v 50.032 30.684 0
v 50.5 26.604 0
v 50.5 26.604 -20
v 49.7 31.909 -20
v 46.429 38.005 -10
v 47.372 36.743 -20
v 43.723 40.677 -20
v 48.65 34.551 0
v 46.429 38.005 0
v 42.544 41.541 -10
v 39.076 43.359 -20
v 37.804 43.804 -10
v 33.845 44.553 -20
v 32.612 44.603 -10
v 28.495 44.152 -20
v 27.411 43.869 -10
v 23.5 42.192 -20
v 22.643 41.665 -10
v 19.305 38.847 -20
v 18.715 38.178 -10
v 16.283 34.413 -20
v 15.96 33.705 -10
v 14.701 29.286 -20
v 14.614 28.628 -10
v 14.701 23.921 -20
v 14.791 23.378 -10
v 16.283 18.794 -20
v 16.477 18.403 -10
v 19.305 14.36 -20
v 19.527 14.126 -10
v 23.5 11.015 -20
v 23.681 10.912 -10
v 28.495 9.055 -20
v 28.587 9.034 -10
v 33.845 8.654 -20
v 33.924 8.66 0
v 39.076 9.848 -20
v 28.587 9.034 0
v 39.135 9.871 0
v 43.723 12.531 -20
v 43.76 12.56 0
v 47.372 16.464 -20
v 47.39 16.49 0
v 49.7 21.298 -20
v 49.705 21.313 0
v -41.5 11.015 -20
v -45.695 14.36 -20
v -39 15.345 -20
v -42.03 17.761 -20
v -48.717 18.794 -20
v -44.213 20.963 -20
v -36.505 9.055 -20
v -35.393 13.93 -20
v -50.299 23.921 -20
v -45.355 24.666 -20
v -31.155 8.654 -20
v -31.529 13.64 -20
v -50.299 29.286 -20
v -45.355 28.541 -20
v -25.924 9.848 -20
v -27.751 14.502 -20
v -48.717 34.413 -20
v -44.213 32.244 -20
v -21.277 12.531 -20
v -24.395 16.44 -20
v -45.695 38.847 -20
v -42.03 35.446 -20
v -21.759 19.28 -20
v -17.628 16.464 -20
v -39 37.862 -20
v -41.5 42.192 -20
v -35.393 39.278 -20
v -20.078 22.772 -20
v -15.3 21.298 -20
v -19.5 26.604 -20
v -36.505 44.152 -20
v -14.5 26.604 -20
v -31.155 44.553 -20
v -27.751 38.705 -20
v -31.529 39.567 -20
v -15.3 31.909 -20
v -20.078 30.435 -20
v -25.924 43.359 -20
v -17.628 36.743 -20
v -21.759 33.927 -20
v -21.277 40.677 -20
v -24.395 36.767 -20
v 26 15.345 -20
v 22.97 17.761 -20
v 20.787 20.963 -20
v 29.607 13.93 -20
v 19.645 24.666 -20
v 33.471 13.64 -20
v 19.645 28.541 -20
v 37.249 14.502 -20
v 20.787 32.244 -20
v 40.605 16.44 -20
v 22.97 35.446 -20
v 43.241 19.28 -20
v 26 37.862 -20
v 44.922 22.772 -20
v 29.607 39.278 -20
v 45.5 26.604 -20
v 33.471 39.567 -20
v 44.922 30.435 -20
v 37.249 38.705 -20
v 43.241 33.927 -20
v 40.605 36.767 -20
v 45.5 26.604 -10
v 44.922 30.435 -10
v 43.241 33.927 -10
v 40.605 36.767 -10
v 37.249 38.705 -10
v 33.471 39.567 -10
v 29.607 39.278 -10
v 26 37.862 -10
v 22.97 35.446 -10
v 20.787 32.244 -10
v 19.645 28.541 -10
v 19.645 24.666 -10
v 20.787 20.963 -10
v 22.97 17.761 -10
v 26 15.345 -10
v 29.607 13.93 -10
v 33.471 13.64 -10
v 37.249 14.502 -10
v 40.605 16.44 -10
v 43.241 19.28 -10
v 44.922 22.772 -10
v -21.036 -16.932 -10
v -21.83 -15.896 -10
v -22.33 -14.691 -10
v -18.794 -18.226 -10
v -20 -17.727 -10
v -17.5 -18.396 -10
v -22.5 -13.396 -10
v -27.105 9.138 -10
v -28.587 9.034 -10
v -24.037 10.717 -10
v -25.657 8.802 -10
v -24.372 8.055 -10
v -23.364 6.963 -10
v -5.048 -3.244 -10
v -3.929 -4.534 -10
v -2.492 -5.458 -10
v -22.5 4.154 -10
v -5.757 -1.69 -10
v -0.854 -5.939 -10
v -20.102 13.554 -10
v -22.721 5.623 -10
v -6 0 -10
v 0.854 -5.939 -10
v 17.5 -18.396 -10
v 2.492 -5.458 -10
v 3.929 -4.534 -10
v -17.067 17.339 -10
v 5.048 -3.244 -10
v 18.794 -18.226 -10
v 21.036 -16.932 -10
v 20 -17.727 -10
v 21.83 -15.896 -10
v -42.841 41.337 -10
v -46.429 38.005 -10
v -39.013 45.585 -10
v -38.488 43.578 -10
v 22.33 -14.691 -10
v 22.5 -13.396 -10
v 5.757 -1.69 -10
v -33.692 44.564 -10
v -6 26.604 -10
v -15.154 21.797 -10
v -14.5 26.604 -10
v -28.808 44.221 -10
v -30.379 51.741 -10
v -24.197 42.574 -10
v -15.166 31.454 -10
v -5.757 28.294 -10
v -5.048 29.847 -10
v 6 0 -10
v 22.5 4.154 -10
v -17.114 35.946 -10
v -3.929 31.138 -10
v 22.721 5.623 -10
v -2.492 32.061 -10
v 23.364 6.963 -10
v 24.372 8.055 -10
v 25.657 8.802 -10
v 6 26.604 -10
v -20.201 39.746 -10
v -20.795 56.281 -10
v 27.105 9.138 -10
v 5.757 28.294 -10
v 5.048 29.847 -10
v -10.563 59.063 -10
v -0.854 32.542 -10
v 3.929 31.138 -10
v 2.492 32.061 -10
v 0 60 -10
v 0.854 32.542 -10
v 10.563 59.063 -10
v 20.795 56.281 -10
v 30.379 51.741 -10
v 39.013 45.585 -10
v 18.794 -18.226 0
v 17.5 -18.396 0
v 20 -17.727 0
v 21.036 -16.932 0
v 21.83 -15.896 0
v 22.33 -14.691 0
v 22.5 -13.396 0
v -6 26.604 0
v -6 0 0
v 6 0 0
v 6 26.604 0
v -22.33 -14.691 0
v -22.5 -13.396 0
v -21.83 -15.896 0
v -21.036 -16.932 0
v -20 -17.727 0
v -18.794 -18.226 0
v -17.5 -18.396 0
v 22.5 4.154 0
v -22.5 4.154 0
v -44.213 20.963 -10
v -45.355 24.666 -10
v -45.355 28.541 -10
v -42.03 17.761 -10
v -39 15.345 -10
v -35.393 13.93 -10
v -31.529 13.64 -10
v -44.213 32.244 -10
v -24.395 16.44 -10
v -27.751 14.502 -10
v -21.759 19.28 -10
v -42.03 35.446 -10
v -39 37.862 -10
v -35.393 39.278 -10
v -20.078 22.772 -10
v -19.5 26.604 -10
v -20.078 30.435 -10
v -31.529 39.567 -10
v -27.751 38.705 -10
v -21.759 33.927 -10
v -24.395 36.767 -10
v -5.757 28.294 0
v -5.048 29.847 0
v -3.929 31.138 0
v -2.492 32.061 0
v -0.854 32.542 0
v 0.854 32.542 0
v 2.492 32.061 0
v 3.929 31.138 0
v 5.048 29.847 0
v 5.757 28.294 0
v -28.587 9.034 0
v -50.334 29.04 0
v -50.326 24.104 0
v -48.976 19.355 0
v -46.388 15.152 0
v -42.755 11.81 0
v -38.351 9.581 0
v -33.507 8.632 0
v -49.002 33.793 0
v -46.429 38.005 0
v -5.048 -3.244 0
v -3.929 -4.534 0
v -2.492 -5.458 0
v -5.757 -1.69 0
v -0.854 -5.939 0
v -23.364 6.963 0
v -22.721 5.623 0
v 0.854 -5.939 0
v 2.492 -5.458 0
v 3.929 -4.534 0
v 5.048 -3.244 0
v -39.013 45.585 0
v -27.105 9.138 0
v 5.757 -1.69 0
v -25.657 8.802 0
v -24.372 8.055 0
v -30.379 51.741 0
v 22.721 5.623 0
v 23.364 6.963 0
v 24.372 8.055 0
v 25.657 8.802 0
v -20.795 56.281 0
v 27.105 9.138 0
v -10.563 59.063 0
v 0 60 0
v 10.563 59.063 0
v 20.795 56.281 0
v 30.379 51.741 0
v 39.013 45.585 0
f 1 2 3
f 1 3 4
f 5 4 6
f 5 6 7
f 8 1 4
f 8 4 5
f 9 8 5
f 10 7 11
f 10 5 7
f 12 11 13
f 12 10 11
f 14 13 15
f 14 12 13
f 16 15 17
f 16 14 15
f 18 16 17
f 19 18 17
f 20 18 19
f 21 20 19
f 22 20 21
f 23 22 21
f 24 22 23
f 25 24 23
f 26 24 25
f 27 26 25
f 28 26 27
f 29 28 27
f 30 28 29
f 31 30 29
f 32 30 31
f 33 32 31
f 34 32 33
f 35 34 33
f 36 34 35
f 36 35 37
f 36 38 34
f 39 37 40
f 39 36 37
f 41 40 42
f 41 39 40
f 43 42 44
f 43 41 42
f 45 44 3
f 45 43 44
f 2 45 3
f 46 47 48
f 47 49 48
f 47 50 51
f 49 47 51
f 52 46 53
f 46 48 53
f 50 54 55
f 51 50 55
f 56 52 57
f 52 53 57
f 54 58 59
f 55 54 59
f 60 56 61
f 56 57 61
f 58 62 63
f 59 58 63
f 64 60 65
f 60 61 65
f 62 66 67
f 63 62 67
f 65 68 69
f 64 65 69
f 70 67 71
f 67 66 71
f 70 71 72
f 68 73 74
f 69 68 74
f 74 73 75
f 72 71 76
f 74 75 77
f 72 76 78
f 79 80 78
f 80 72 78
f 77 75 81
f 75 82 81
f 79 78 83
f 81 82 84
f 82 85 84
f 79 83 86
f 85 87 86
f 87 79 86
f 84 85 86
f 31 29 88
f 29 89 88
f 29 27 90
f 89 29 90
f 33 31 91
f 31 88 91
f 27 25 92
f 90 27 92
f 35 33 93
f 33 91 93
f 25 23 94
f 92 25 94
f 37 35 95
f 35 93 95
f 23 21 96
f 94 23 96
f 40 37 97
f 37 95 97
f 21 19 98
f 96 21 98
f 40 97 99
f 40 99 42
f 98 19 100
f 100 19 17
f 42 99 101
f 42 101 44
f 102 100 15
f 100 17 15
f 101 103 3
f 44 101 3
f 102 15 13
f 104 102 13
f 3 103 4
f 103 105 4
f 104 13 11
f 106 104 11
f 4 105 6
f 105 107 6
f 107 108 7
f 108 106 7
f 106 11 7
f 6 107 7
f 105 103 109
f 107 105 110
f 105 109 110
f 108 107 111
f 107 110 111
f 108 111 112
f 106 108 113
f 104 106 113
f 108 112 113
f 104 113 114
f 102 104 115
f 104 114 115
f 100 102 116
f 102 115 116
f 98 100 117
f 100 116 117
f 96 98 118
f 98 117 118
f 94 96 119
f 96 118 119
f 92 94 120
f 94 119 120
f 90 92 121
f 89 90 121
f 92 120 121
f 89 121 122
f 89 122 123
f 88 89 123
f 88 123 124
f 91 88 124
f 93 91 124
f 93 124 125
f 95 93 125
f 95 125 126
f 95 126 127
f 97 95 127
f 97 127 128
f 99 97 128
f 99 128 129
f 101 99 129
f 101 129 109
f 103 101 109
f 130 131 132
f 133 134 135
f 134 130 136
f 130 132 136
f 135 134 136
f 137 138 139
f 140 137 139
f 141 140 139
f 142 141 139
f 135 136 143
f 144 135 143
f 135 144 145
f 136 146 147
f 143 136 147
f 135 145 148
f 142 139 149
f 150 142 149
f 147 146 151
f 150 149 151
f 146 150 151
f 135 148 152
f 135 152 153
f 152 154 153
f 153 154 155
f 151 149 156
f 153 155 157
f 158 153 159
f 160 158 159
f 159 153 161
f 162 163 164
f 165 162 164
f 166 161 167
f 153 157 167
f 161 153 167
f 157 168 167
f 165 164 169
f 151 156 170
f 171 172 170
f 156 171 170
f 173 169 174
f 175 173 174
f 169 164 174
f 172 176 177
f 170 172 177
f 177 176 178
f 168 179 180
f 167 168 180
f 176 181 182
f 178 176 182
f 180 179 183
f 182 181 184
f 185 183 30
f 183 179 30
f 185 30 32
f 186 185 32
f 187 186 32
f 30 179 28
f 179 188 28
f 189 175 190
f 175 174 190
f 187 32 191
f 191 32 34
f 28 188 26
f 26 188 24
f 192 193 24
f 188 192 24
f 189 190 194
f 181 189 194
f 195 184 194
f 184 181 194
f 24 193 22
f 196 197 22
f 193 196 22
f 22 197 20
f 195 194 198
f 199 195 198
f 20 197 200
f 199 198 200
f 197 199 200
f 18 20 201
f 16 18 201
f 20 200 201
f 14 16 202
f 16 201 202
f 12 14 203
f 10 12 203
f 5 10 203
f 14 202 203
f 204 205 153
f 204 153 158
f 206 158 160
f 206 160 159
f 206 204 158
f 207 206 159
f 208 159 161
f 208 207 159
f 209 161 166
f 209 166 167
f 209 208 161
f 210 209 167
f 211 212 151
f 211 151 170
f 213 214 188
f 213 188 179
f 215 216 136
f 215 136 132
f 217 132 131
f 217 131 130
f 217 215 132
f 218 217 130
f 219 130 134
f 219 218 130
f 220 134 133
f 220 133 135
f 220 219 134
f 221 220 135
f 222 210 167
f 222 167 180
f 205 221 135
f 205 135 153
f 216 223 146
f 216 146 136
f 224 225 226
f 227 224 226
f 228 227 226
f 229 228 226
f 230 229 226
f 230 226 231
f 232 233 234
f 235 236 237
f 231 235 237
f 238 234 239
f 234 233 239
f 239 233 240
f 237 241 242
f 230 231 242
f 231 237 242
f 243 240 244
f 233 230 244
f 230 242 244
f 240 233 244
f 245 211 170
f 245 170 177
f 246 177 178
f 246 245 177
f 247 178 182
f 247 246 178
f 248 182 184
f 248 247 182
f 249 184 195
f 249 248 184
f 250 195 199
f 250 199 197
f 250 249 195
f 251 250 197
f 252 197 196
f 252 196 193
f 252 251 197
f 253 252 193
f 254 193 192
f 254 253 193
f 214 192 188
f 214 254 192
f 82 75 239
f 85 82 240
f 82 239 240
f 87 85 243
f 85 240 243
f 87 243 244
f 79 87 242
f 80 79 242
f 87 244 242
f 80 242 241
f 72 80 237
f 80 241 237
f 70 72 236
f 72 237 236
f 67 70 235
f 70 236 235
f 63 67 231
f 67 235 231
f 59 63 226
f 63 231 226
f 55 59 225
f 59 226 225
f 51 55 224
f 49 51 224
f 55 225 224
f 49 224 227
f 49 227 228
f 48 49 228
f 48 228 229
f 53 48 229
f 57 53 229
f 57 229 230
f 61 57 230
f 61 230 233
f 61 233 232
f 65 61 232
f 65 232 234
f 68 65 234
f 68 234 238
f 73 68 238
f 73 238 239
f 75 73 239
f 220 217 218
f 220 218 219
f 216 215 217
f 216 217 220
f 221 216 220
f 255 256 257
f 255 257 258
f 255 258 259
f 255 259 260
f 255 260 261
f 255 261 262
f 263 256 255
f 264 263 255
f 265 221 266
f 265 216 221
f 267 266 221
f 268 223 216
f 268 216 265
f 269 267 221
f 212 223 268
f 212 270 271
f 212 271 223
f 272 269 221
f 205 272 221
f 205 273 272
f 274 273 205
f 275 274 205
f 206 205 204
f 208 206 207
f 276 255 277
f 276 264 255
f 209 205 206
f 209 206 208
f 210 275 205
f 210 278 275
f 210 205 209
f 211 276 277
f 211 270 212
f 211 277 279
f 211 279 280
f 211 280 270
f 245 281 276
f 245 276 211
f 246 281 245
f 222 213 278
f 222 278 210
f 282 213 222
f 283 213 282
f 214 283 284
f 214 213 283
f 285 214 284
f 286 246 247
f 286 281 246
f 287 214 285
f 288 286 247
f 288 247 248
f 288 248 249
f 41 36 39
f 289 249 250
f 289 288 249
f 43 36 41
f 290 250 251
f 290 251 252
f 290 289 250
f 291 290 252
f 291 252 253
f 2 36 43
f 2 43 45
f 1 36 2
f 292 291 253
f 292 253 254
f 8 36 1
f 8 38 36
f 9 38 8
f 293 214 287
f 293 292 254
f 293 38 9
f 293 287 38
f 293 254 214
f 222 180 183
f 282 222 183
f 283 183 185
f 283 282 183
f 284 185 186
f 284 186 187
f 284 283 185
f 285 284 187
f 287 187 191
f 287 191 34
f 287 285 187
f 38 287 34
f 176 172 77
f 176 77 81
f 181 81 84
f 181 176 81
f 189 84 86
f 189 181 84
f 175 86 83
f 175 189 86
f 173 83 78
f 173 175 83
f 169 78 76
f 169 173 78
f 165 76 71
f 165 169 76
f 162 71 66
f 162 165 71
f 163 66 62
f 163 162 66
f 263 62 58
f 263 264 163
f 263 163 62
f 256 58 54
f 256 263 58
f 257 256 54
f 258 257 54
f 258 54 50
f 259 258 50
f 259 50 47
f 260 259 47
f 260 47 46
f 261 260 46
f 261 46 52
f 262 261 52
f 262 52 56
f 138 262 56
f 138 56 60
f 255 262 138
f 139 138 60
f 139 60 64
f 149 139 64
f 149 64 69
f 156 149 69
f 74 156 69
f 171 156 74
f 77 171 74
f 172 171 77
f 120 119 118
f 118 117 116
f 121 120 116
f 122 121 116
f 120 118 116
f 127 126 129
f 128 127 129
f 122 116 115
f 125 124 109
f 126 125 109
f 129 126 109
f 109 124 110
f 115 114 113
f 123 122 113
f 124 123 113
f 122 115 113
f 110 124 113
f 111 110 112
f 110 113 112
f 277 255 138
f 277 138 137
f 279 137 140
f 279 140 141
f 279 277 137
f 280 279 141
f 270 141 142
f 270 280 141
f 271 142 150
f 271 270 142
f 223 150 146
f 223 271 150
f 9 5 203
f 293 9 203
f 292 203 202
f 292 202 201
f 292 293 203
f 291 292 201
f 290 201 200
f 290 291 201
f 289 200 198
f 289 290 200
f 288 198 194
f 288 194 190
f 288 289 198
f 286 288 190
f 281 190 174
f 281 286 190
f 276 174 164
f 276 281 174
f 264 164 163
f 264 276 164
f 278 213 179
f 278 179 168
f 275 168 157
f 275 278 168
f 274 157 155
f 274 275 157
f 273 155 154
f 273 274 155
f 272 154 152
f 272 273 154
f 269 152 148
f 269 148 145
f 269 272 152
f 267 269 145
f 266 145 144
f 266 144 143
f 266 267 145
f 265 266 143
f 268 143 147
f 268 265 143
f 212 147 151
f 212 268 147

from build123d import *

# Parameters (mm, degrees)
BOSS_EXTRUDE1_DEPTH   = 10
SKETCH1_R             = 13
BOSS_EXTRUDE1_2_DEPTH = 10
BOSS_EXTRUDE1_3_DEPTH = 10
SKETCH1_3_R           = 18
SKETCH1_3_R_2         = 13
BOSS_EXTRUDE2_DEPTH   = 20


with BuildPart() as part:
    # Sketch1 → Boss-Extrude1 (new body)
    with BuildSketch(Plane.XY):
        with BuildLine():
            ThreePointArc((-22.5, -13.396428811), (-21.035533906, -16.931962717), (-17.5, -18.396428811))
            Line((-17.5, -18.396428811), (17.5, -18.396428811))
            ThreePointArc((17.5, -18.396428811), (21.035533906, -16.931962717), (22.5, -13.396428811))
            Line((22.5, -13.396428811), (22.5, 4.153626868))
            ThreePointArc((22.5, 4.153626868), (24.372283789, 8.054574356), (28.586956522, 9.034049547))
            ThreePointArc((28.586956522, 9.034049547), (17.17328588, 36.042418273), (46.428571429, 38.005101698))
            ThreePointArc((46.428571429, 38.005101698), (0, 60), (-46.428571429, 38.005101698))
            ThreePointArc((-46.428571429, 38.005101698), (-17.17328588, 36.042418273), (-28.586956522, 9.034049547))
            ThreePointArc((-28.586956522, 9.034049547), (-24.372283789, 8.054574356), (-22.5, 4.153626868))
            Line((-22.5, 4.153626868), (-22.5, -13.396428811))
        make_face()
        with BuildLine():
            ThreePointArc((6, 0), (0, -6), (-6, 0))
            Line((-6, 0), (-6, 26.603571189))
            ThreePointArc((-6, 26.603571189), (0, 32.603571189), (6, 26.603571189))
            Line((6, 26.603571189), (6, 0))
        make_face(mode=Mode.SUBTRACT)
    extrude(amount=-BOSS_EXTRUDE1_DEPTH)



with BuildPart() as body_2:
    # Sketch1 → Boss-Extrude1 2 (new body)
    with BuildSketch(Plane.XY):
        with Locations((-32.5, 26.603571189)):
            Circle(SKETCH1_R)
    extrude(amount=-BOSS_EXTRUDE1_2_DEPTH)


with BuildPart() as body_3:
    # Sketch1 → Boss-Extrude1 3 (new body)
    with BuildSketch(Plane.XY):
        with Locations((32.5, 26.603571189)):
            Circle(SKETCH1_R)
    extrude(amount=-BOSS_EXTRUDE1_3_DEPTH)


with BuildPart() as part_1:
    add(part.part)

    add(body_2.part)  # Boss-Extrude2 merges body 2

    add(body_3.part)  # Boss-Extrude2 merges body 3
    # Sketch1<3> → Boss-Extrude2 (add)
    # profile 1 of 2: a face of its own
    with BuildSketch(Plane.XY):
        with Locations((-32.5, 26.603571189)):
            Circle(SKETCH1_3_R)
        with Locations((-32.5, 26.603571189)):
            Circle(SKETCH1_3_R_2, mode=Mode.SUBTRACT)
    # profile 2 of 2: a face of its own
    with BuildSketch(Plane.XY):
        with Locations((32.5, 26.603571189)):
            Circle(SKETCH1_3_R)
        with Locations((32.5, 26.603571189)):
            Circle(SKETCH1_3_R_2, mode=Mode.SUBTRACT)
    extrude(amount=-BOSS_EXTRUDE2_DEPTH)


solid = part_1.part
